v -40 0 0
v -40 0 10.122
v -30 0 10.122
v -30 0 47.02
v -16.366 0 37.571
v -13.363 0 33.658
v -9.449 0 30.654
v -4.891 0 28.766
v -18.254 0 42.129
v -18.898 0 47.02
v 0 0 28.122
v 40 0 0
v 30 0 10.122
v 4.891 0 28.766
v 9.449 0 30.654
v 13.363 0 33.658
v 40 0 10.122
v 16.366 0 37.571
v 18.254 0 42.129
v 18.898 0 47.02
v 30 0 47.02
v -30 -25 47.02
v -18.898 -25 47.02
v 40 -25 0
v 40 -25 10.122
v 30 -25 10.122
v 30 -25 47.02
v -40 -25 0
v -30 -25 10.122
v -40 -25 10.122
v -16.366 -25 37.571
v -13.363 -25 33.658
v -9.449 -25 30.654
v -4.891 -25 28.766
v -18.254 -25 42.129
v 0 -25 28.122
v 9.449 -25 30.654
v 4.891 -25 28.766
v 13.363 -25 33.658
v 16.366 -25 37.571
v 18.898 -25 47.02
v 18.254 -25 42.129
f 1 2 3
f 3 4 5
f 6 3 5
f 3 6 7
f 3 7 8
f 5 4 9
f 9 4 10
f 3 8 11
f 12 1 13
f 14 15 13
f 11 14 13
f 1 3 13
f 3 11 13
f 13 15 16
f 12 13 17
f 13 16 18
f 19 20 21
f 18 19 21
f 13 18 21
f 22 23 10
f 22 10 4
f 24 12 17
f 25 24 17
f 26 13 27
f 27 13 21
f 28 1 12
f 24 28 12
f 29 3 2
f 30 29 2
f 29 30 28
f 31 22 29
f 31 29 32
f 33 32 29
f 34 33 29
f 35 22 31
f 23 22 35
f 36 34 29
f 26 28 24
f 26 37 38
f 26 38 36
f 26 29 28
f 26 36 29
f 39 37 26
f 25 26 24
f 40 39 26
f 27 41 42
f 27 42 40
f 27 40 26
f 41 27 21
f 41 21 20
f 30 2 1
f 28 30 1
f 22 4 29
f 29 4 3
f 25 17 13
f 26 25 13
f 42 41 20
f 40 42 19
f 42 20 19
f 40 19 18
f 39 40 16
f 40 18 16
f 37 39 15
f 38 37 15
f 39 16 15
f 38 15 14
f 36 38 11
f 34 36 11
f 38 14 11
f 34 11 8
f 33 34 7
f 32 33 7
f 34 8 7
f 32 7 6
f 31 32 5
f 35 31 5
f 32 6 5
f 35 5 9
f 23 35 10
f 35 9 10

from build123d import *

# Parameters (mm, degrees)
F1_DEPTH = 25


with BuildPart() as f1:
    # F0 (on Front) → F1 (new body)
    with BuildSketch(Plane.XZ):
        with BuildLine():
            Line((-40, 0), (0, 0))
            Line((0, 0), (40, 0))
            Line((40, 0), (40, 10.122449))
            Line((40, 10.122449), (30, 10.122449))
            Line((30, 10.122449), (30, 47.020409))
            Line((30, 47.020409), (18.897959, 47.020409))
            ThreePointArc((18.897959, 47.020409), (0, 28.12245), (-18.897959, 47.020409))
            Line((-18.897959, 47.020409), (-30, 47.020409))
            Line((-30, 47.020409), (-30, 10.122449))
            Line((-30, 10.122449), (-40, 10.122449))
            Line((-40, 10.122449), (-40, 0))
        make_face()
    extrude(amount=F1_DEPTH)


solid = f1.part
